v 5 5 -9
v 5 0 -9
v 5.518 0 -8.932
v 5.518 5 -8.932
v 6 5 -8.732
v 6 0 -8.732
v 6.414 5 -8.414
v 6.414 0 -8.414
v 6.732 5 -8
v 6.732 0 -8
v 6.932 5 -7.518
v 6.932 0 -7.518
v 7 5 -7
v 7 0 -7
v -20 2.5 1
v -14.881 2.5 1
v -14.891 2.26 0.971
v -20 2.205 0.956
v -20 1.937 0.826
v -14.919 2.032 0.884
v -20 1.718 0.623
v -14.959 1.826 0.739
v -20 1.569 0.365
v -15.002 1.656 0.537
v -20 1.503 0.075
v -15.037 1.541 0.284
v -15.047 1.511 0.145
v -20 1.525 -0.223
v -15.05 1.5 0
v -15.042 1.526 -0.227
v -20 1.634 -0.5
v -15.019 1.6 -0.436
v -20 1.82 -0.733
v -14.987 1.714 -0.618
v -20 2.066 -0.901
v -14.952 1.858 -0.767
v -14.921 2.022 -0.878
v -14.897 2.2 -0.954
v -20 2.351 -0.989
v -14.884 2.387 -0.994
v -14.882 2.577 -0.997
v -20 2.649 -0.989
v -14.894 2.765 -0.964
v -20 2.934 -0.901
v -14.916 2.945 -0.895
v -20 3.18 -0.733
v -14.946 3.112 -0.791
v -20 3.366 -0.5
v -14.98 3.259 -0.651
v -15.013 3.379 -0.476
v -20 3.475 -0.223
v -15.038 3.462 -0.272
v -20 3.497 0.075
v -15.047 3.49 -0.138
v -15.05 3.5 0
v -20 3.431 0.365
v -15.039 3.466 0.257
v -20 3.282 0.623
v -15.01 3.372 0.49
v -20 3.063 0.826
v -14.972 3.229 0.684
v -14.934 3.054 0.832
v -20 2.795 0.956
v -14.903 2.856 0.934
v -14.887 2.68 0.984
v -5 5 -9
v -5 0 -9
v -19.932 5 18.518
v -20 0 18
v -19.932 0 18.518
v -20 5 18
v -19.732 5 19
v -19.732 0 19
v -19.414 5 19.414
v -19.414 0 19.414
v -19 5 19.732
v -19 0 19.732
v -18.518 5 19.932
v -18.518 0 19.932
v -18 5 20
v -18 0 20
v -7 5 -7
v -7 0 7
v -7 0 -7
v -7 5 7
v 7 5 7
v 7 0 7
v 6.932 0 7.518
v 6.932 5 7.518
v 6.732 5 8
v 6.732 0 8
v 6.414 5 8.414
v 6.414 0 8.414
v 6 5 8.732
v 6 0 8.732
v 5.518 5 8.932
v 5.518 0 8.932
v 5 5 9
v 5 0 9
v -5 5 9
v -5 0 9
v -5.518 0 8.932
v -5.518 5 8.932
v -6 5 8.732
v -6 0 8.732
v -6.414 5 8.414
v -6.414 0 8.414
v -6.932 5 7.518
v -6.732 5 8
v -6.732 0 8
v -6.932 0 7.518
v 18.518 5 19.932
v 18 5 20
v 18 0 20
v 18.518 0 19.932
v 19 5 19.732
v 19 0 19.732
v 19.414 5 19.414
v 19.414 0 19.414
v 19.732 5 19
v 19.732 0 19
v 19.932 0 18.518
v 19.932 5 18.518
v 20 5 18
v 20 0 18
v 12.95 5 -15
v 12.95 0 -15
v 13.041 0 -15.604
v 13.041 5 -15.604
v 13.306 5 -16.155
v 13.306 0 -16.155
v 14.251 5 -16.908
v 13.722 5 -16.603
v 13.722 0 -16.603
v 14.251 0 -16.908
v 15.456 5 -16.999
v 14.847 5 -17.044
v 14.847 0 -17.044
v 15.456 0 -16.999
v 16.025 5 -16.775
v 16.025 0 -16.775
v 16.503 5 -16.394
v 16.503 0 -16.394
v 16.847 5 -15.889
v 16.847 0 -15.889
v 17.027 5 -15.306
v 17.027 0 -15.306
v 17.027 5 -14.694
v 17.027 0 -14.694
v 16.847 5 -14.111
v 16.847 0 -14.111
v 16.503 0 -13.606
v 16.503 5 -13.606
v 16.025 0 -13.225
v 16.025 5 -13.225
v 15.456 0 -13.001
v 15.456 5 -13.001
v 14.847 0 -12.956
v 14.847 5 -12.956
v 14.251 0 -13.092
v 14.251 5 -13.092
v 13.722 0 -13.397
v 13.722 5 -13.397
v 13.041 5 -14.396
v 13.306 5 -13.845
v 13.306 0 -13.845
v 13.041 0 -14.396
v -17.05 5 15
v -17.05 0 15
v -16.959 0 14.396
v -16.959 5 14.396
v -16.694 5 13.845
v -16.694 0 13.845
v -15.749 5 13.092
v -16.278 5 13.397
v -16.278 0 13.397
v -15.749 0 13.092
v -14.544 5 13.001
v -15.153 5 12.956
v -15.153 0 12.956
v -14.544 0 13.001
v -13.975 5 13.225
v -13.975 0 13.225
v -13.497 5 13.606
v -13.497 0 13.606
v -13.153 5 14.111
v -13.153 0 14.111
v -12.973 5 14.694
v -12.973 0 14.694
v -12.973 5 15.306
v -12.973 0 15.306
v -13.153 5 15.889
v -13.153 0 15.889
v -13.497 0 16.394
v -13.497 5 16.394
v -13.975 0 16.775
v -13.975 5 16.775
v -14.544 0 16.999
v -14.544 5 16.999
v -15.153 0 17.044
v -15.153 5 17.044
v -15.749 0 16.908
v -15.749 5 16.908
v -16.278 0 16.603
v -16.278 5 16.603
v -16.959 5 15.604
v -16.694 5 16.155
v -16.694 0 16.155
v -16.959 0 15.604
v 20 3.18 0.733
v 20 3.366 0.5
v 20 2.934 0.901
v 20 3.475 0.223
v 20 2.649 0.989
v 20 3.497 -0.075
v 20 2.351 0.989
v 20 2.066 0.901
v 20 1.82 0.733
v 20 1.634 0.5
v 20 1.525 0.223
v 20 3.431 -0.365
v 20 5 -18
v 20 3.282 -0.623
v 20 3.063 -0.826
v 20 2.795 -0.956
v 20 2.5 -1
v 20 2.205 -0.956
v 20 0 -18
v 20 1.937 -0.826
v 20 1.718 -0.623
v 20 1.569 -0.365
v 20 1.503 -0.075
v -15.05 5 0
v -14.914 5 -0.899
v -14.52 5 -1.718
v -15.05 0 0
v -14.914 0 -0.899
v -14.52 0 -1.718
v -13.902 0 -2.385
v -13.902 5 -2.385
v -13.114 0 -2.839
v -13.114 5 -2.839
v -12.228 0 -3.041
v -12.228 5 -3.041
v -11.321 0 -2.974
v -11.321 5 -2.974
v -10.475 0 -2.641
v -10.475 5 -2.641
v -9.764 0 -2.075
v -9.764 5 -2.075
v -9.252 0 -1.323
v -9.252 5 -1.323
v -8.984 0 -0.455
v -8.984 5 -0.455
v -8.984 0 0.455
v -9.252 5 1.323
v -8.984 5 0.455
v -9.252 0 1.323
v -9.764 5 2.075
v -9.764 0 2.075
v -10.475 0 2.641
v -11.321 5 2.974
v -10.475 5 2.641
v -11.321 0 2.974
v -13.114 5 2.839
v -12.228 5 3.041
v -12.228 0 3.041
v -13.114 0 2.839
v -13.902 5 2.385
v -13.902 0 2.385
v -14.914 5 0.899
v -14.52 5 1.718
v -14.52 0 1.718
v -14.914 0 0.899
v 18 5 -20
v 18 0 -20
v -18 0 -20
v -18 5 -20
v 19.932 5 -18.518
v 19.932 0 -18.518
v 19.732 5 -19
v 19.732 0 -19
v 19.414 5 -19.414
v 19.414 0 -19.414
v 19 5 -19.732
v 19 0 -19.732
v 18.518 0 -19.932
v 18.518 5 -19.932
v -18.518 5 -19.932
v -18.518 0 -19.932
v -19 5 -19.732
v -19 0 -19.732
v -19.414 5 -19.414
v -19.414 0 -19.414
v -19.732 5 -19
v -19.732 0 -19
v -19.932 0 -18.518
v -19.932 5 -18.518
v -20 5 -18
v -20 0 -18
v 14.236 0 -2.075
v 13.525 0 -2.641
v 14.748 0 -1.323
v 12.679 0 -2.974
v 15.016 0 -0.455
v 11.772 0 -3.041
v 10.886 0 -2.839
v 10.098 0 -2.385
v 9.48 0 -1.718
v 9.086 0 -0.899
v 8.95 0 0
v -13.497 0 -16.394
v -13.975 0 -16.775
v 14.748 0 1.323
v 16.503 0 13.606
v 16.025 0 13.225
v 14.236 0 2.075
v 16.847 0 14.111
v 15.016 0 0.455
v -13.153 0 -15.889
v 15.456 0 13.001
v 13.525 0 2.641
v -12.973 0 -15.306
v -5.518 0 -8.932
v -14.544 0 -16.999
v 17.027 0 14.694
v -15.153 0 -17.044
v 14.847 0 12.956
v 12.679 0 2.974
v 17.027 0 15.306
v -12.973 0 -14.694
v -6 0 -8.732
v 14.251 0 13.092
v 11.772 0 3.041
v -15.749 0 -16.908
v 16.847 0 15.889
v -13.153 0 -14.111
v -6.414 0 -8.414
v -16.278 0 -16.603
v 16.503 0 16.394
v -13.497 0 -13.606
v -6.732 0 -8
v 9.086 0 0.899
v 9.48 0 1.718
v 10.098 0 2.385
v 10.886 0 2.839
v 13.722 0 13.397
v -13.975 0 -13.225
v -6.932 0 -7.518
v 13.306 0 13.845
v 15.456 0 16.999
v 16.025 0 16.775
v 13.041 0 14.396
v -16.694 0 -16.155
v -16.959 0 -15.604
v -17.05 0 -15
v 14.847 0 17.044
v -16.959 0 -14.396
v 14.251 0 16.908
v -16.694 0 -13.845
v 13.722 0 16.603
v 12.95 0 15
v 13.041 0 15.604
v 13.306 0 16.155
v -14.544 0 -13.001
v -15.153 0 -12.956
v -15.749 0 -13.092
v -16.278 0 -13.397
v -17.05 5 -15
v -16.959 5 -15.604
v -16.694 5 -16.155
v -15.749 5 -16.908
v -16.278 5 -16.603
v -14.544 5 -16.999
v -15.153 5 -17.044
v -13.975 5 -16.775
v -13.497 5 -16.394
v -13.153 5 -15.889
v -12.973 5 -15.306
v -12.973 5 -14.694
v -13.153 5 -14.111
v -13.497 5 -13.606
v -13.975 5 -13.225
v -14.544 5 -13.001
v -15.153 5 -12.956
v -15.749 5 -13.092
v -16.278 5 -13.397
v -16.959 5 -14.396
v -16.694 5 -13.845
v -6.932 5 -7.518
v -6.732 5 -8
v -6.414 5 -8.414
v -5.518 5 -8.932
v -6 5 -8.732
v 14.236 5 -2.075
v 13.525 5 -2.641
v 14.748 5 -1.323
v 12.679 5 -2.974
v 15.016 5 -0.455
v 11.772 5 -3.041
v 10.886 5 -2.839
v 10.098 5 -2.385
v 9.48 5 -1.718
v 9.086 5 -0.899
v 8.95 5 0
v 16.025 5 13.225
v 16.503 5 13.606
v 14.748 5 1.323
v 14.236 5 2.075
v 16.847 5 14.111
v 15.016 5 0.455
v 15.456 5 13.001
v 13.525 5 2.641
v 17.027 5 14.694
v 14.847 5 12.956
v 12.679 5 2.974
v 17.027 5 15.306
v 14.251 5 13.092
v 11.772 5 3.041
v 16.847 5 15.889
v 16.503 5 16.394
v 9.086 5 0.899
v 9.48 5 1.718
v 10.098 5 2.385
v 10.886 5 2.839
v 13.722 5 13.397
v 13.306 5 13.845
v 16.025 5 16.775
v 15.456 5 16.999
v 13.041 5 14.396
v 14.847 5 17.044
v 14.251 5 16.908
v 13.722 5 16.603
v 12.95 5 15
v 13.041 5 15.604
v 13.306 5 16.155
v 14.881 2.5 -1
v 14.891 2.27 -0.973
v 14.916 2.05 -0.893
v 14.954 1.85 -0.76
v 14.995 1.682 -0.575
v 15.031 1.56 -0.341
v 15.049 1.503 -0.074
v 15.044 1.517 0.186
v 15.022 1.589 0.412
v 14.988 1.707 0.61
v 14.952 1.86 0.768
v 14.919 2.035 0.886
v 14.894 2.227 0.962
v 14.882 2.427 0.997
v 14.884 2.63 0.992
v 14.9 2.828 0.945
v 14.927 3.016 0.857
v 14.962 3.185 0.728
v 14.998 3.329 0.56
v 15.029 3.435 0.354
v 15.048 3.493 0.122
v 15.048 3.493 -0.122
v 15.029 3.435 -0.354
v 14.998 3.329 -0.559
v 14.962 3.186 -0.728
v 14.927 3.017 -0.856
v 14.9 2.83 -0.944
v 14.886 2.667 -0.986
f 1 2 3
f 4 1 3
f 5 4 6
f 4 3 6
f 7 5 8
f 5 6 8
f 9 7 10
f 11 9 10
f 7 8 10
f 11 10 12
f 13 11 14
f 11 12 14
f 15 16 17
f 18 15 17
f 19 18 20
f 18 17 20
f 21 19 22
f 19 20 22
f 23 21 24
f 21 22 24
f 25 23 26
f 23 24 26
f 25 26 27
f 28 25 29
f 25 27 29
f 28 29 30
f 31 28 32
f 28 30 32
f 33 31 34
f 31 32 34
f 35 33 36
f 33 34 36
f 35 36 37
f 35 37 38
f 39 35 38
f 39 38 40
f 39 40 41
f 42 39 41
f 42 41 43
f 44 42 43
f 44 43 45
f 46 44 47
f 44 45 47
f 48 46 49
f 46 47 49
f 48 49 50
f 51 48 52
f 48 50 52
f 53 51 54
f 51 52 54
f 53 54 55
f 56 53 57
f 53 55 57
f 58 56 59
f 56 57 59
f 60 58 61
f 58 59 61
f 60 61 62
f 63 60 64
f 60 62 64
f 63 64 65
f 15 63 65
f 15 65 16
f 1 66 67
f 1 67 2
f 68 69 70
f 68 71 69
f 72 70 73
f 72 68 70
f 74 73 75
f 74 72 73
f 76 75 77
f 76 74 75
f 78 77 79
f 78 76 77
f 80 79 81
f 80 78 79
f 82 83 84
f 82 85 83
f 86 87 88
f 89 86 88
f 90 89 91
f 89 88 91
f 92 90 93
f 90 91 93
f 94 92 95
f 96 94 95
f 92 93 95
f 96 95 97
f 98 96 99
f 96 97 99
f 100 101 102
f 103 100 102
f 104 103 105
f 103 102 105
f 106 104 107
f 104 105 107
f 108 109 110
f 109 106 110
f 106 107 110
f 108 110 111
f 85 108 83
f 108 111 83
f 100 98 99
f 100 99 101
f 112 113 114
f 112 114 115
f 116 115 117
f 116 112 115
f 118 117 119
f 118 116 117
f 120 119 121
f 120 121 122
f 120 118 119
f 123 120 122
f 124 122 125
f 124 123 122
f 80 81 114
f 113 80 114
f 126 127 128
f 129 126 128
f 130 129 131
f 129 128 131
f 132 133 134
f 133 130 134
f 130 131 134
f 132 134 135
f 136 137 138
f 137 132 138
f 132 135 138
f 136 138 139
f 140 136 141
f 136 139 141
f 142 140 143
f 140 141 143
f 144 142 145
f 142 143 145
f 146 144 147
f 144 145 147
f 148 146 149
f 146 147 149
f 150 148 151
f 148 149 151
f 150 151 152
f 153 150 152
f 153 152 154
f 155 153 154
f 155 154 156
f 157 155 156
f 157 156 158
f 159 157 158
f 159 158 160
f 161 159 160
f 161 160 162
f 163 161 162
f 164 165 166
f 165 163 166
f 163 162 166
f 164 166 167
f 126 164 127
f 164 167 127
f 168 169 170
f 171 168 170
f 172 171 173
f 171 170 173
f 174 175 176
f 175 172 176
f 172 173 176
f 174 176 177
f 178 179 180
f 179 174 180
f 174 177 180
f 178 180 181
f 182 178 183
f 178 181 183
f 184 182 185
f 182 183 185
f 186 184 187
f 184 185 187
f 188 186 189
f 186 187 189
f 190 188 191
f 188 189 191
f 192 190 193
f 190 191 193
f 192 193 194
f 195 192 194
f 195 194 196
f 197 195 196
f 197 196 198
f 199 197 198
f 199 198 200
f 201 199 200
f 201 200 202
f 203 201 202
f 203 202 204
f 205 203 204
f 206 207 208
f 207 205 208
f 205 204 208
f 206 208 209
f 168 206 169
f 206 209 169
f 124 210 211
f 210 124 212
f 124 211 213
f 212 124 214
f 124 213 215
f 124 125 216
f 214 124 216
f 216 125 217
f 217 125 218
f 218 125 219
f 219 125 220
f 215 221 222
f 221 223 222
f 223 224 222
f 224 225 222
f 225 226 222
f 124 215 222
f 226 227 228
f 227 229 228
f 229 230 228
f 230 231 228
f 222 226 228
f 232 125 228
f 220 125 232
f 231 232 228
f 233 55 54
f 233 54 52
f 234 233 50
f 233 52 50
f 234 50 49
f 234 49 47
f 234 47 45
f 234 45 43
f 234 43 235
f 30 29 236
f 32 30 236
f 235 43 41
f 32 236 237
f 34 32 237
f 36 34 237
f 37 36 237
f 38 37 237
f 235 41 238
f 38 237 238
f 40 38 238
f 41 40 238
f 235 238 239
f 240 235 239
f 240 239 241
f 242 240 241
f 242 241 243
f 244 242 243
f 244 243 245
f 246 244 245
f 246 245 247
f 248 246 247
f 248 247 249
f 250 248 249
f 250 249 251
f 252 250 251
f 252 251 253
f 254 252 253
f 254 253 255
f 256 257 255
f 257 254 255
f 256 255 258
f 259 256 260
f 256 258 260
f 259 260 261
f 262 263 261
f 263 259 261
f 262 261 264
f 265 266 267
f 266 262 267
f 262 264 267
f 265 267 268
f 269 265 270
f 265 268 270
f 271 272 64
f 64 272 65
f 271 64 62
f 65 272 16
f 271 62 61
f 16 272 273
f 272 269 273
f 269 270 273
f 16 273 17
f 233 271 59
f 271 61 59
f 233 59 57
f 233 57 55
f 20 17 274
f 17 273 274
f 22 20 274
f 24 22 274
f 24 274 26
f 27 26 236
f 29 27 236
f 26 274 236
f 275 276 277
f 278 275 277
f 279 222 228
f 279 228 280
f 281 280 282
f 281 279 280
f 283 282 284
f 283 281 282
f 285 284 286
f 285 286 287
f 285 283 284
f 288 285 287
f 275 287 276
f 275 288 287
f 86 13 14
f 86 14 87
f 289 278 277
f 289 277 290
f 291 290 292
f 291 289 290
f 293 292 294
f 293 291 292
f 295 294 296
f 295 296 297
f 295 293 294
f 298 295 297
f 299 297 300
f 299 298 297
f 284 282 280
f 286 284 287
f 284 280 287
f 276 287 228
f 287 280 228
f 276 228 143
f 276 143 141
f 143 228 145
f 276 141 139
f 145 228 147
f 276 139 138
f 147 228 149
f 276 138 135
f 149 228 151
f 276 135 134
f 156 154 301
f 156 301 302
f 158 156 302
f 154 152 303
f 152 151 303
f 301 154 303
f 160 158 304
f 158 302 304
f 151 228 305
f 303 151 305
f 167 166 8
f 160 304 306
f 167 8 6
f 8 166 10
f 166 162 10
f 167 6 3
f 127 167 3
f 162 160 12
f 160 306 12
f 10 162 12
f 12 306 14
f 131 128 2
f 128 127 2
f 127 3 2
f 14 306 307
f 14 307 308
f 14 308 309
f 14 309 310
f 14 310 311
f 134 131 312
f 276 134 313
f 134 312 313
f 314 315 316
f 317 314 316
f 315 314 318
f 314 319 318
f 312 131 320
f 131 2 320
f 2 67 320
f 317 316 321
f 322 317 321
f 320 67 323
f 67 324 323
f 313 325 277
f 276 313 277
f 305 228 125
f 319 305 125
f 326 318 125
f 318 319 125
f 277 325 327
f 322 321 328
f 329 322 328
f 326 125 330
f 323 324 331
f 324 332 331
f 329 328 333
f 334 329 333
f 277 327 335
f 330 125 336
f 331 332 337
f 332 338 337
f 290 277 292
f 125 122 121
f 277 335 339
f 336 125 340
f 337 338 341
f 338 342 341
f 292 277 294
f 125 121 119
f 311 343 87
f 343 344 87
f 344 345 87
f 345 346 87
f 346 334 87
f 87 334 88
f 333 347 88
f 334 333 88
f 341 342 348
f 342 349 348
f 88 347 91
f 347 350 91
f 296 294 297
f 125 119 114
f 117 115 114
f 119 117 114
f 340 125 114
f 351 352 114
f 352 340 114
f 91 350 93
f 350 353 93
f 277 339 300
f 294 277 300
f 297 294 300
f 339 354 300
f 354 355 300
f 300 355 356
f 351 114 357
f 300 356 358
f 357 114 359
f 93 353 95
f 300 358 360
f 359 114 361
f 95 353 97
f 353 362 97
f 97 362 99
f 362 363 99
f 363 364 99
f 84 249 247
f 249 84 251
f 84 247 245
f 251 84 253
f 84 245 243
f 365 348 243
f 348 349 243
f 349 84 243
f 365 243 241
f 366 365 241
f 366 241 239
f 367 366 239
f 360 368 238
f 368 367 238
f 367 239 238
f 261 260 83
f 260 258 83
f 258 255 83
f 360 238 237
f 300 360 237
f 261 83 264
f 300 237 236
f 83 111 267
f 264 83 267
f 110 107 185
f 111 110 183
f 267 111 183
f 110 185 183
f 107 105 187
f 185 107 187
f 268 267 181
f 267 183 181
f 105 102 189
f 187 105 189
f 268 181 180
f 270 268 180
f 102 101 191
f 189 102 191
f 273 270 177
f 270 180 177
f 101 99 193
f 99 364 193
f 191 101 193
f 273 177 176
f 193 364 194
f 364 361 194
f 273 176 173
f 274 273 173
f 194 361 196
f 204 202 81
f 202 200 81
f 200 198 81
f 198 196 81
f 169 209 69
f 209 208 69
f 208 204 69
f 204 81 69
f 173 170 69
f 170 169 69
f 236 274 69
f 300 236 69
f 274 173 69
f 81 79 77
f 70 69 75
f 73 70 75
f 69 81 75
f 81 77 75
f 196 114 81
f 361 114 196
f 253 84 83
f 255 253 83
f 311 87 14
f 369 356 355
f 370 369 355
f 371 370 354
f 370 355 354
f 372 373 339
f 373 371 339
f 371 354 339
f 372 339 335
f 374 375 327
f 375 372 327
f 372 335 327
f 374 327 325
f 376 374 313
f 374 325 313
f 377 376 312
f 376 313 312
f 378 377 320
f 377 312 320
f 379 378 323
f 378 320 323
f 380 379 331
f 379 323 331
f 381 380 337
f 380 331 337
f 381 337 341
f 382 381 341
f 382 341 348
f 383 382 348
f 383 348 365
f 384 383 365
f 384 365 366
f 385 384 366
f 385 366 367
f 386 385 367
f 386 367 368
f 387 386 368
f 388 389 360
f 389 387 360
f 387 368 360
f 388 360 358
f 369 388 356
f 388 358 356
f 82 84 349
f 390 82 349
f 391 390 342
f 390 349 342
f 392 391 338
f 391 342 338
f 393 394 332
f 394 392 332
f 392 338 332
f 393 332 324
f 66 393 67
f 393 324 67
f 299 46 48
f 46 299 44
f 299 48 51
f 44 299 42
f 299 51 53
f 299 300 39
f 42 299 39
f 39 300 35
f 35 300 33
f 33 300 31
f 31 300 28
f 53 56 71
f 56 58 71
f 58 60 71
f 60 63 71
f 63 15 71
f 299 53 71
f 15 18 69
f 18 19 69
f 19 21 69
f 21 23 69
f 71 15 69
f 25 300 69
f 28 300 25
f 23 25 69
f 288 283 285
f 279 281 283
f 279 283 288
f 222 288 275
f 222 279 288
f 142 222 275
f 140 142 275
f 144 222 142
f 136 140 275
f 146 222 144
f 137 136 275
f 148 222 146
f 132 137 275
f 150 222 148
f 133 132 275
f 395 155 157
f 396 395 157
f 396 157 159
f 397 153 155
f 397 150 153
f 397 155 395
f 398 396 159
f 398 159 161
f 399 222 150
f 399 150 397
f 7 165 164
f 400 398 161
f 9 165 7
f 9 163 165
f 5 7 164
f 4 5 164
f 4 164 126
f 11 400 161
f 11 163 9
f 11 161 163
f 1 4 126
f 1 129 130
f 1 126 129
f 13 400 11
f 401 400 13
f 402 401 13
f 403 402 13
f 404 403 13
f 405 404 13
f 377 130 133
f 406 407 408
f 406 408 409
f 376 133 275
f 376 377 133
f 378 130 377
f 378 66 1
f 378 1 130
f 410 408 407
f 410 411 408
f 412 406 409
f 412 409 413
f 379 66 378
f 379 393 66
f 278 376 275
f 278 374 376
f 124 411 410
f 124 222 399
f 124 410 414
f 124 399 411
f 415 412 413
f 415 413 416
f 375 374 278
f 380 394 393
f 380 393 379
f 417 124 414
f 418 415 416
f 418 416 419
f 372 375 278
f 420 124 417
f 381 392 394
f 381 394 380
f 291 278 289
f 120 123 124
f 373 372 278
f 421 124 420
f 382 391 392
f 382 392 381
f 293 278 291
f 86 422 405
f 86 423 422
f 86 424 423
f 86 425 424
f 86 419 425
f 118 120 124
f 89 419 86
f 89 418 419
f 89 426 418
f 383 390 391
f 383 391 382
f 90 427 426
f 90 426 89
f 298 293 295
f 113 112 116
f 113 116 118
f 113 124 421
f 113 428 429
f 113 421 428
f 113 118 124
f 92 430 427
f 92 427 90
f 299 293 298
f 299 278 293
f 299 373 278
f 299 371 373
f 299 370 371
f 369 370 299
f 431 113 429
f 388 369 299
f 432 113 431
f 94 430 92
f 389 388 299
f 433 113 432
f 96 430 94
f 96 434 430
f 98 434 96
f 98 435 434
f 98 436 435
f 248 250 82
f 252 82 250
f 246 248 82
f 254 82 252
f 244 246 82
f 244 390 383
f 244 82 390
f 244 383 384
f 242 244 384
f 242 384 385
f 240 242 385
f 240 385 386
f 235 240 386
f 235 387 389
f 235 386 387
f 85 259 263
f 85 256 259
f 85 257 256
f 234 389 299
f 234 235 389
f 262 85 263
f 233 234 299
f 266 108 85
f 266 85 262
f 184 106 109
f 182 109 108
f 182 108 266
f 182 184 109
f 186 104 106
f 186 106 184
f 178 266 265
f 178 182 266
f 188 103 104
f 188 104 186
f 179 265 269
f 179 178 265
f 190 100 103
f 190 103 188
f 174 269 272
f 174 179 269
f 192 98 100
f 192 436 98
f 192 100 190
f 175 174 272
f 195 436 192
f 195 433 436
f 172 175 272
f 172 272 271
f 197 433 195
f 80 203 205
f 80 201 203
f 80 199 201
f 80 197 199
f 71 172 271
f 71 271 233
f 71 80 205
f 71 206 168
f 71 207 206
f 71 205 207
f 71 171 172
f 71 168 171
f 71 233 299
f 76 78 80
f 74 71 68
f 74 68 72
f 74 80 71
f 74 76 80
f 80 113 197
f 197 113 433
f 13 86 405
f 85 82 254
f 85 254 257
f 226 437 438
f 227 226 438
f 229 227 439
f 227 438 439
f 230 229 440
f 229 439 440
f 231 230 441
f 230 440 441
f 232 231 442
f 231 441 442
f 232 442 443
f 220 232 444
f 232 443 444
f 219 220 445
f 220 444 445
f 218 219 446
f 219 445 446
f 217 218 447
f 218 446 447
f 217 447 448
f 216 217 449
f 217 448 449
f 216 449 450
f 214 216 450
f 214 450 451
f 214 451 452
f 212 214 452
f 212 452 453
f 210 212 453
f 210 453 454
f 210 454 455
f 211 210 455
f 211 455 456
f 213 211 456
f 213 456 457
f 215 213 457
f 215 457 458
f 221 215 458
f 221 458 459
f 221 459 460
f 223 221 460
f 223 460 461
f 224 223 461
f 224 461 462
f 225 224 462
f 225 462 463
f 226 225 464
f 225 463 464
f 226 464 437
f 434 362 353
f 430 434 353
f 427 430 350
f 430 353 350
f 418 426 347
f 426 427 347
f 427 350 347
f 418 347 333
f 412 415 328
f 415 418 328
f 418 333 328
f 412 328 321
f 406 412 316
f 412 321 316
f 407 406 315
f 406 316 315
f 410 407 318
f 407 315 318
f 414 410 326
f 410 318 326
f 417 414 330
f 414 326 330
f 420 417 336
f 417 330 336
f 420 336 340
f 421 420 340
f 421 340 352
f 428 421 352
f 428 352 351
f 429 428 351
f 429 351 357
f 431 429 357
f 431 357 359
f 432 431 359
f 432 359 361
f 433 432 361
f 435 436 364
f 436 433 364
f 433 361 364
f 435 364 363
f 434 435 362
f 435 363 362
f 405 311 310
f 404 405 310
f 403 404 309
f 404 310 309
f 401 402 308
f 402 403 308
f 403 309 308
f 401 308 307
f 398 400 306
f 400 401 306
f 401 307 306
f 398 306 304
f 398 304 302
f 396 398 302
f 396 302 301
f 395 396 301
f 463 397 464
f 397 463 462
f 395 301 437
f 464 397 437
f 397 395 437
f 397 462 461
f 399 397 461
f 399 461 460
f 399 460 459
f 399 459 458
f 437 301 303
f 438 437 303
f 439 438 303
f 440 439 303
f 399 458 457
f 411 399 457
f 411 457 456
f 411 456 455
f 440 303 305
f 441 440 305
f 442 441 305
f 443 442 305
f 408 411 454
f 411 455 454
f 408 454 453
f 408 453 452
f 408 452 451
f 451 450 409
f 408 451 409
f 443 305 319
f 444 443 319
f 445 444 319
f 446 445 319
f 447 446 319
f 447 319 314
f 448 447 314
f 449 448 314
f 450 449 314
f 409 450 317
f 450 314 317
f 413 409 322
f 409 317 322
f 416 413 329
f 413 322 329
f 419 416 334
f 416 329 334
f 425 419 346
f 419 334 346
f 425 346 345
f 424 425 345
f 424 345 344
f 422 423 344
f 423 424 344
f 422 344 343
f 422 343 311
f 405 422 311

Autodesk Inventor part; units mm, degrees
ref_plane "YZ Plane" through (0, 0, 0) normal (1, 0, 0) x (0, 1, 0)
ref_plane "XZ Plane" through (0, 0, 0) normal (0, 1, 0) x (-1, 0, 0)
ref_plane "XY Plane" through (0, 0, 0) normal (0, 0, 1) x (1, 0, 0)
sketch "Sketch1" plane through (0, 0, 0) normal (0, 1, 0) x (-1, 0, 0)
  line L0 (-17.5, -17.5) -> (17.5, 17.5) construction
  line L1 (17.5, -17.5) -> (-17.5, 17.5) construction
  circle A0 centre (15, -15) radius 2.05
  circle A1 centre (-15, -15) radius 2.05
  circle A2 centre (-15, 15) radius 2.05
  circle A3 centre (15, 15) radius 2.05
  line L2 (20, 20) -> (-20, 20)
  line L3 (-20, 20) -> (-20, -20)
  line L4 (-20, -20) -> (20, -20)
  line L5 (20, -20) -> (20, 20)
  line L6 (20, 20) -> (-20, -20) construction
  line L7 (-20, 20) -> (20, -20) construction
  circle A4 centre (12, 0) radius 3.05
  circle A5 centre (-12, 0) radius 3.05
  point P0 (0, 0)
  dimension "d0" = 35
  dimension "d1" = 35
  dimension "d2" = 4.1
  dimension "d3" = 4.1
  dimension "d4" = 4.1
  dimension "d5" = 4.1
  dimension "d6" = 30
  dimension "d7" = 30
  dimension "d8" = 30
  dimension "d9" = 30
  dimension "d10" = 40
  dimension "d11" = 40
  dimension "d14" = 6.1
  dimension "d15" = 8
  dimension "d16" = 6.1
  dimension "d17" = 8
extrude "Extrusion2" add sketch "Sketch1" along normal blind 5
sketch "Sketch2" plane through (20, 0, 20) normal (1, 0, 0) x (0, 0, -1)
  circle A0 centre (20, 2.5) radius 1
  line L0 (0, 5) -> (40, 5) projected
  point P0 (20, 0)
  dimension "d20" = 2
  dimension "d21" = 2.5
hole "Hole1" at (20, 2.5, 0) direction (-1, 0, 0) diameter 2 depth 8 tip angle 118
thread "Thread1" size "M2x0.4" class "6H" standard "ANSI Metric M Profile" full length
sketch "Sketch3" plane through (-20, 0, -20) normal (-1, 0, 0) x (0, 0, 1)
  circle A0 centre (20, 2.5) radius 1 projected
  circle A1 centre (20, 2.5) radius 1
  point P0 (20, 0)
  dimension "d31" = 2
hole "Hole2" at (-20, 2.5, 0) direction (1, 0, 0) diameter 2 depth 8 tip angle 118
thread "Thread2" size "M2x0.4" class "6H" standard "ANSI Metric M Profile" full length
sketch "Sketch4" plane through (0, 5, 0) normal (0, 1, 0) x (1, 0, 0)
  line L0 (7, -9) -> (-7, -9)
  line L1 (-7, -9) -> (-7, 9)
  line L2 (-7, 9) -> (7, 9)
  line L3 (7, 9) -> (7, -9)
  line L4 (7, -9) -> (-7, 9) construction
  line L5 (-7, -9) -> (7, 9) construction
  point P0 (0, 0)
  dimension "d41" = 14
  dimension "d42" = 18
extrude "Extrusion3" cut sketch "Sketch4" against normal blind 10
fillet "Fillet1" radius 2 1 edges at (20, 2.5, 20)
fillet "Fillet2" radius 2 1 edges at (20, 2.5, -20)
fillet "Fillet3" radius 2 1 edges at (-20, 2.5, -20)
fillet "Fillet4" radius 2 1 edges at (-20, 2.5, 20)
fillet "Fillet5" radius 2 1 edges at (-7, 2.5, -9)
fillet "Fillet6" radius 2 1 edges at (-7, 2.5, 9)
fillet "Fillet7" radius 2 1 edges at (7, 2.5, -9)
fillet "Fillet8" radius 2 1 edges at (7, 2.5, 9)
properties part number "AdapterPlate"
